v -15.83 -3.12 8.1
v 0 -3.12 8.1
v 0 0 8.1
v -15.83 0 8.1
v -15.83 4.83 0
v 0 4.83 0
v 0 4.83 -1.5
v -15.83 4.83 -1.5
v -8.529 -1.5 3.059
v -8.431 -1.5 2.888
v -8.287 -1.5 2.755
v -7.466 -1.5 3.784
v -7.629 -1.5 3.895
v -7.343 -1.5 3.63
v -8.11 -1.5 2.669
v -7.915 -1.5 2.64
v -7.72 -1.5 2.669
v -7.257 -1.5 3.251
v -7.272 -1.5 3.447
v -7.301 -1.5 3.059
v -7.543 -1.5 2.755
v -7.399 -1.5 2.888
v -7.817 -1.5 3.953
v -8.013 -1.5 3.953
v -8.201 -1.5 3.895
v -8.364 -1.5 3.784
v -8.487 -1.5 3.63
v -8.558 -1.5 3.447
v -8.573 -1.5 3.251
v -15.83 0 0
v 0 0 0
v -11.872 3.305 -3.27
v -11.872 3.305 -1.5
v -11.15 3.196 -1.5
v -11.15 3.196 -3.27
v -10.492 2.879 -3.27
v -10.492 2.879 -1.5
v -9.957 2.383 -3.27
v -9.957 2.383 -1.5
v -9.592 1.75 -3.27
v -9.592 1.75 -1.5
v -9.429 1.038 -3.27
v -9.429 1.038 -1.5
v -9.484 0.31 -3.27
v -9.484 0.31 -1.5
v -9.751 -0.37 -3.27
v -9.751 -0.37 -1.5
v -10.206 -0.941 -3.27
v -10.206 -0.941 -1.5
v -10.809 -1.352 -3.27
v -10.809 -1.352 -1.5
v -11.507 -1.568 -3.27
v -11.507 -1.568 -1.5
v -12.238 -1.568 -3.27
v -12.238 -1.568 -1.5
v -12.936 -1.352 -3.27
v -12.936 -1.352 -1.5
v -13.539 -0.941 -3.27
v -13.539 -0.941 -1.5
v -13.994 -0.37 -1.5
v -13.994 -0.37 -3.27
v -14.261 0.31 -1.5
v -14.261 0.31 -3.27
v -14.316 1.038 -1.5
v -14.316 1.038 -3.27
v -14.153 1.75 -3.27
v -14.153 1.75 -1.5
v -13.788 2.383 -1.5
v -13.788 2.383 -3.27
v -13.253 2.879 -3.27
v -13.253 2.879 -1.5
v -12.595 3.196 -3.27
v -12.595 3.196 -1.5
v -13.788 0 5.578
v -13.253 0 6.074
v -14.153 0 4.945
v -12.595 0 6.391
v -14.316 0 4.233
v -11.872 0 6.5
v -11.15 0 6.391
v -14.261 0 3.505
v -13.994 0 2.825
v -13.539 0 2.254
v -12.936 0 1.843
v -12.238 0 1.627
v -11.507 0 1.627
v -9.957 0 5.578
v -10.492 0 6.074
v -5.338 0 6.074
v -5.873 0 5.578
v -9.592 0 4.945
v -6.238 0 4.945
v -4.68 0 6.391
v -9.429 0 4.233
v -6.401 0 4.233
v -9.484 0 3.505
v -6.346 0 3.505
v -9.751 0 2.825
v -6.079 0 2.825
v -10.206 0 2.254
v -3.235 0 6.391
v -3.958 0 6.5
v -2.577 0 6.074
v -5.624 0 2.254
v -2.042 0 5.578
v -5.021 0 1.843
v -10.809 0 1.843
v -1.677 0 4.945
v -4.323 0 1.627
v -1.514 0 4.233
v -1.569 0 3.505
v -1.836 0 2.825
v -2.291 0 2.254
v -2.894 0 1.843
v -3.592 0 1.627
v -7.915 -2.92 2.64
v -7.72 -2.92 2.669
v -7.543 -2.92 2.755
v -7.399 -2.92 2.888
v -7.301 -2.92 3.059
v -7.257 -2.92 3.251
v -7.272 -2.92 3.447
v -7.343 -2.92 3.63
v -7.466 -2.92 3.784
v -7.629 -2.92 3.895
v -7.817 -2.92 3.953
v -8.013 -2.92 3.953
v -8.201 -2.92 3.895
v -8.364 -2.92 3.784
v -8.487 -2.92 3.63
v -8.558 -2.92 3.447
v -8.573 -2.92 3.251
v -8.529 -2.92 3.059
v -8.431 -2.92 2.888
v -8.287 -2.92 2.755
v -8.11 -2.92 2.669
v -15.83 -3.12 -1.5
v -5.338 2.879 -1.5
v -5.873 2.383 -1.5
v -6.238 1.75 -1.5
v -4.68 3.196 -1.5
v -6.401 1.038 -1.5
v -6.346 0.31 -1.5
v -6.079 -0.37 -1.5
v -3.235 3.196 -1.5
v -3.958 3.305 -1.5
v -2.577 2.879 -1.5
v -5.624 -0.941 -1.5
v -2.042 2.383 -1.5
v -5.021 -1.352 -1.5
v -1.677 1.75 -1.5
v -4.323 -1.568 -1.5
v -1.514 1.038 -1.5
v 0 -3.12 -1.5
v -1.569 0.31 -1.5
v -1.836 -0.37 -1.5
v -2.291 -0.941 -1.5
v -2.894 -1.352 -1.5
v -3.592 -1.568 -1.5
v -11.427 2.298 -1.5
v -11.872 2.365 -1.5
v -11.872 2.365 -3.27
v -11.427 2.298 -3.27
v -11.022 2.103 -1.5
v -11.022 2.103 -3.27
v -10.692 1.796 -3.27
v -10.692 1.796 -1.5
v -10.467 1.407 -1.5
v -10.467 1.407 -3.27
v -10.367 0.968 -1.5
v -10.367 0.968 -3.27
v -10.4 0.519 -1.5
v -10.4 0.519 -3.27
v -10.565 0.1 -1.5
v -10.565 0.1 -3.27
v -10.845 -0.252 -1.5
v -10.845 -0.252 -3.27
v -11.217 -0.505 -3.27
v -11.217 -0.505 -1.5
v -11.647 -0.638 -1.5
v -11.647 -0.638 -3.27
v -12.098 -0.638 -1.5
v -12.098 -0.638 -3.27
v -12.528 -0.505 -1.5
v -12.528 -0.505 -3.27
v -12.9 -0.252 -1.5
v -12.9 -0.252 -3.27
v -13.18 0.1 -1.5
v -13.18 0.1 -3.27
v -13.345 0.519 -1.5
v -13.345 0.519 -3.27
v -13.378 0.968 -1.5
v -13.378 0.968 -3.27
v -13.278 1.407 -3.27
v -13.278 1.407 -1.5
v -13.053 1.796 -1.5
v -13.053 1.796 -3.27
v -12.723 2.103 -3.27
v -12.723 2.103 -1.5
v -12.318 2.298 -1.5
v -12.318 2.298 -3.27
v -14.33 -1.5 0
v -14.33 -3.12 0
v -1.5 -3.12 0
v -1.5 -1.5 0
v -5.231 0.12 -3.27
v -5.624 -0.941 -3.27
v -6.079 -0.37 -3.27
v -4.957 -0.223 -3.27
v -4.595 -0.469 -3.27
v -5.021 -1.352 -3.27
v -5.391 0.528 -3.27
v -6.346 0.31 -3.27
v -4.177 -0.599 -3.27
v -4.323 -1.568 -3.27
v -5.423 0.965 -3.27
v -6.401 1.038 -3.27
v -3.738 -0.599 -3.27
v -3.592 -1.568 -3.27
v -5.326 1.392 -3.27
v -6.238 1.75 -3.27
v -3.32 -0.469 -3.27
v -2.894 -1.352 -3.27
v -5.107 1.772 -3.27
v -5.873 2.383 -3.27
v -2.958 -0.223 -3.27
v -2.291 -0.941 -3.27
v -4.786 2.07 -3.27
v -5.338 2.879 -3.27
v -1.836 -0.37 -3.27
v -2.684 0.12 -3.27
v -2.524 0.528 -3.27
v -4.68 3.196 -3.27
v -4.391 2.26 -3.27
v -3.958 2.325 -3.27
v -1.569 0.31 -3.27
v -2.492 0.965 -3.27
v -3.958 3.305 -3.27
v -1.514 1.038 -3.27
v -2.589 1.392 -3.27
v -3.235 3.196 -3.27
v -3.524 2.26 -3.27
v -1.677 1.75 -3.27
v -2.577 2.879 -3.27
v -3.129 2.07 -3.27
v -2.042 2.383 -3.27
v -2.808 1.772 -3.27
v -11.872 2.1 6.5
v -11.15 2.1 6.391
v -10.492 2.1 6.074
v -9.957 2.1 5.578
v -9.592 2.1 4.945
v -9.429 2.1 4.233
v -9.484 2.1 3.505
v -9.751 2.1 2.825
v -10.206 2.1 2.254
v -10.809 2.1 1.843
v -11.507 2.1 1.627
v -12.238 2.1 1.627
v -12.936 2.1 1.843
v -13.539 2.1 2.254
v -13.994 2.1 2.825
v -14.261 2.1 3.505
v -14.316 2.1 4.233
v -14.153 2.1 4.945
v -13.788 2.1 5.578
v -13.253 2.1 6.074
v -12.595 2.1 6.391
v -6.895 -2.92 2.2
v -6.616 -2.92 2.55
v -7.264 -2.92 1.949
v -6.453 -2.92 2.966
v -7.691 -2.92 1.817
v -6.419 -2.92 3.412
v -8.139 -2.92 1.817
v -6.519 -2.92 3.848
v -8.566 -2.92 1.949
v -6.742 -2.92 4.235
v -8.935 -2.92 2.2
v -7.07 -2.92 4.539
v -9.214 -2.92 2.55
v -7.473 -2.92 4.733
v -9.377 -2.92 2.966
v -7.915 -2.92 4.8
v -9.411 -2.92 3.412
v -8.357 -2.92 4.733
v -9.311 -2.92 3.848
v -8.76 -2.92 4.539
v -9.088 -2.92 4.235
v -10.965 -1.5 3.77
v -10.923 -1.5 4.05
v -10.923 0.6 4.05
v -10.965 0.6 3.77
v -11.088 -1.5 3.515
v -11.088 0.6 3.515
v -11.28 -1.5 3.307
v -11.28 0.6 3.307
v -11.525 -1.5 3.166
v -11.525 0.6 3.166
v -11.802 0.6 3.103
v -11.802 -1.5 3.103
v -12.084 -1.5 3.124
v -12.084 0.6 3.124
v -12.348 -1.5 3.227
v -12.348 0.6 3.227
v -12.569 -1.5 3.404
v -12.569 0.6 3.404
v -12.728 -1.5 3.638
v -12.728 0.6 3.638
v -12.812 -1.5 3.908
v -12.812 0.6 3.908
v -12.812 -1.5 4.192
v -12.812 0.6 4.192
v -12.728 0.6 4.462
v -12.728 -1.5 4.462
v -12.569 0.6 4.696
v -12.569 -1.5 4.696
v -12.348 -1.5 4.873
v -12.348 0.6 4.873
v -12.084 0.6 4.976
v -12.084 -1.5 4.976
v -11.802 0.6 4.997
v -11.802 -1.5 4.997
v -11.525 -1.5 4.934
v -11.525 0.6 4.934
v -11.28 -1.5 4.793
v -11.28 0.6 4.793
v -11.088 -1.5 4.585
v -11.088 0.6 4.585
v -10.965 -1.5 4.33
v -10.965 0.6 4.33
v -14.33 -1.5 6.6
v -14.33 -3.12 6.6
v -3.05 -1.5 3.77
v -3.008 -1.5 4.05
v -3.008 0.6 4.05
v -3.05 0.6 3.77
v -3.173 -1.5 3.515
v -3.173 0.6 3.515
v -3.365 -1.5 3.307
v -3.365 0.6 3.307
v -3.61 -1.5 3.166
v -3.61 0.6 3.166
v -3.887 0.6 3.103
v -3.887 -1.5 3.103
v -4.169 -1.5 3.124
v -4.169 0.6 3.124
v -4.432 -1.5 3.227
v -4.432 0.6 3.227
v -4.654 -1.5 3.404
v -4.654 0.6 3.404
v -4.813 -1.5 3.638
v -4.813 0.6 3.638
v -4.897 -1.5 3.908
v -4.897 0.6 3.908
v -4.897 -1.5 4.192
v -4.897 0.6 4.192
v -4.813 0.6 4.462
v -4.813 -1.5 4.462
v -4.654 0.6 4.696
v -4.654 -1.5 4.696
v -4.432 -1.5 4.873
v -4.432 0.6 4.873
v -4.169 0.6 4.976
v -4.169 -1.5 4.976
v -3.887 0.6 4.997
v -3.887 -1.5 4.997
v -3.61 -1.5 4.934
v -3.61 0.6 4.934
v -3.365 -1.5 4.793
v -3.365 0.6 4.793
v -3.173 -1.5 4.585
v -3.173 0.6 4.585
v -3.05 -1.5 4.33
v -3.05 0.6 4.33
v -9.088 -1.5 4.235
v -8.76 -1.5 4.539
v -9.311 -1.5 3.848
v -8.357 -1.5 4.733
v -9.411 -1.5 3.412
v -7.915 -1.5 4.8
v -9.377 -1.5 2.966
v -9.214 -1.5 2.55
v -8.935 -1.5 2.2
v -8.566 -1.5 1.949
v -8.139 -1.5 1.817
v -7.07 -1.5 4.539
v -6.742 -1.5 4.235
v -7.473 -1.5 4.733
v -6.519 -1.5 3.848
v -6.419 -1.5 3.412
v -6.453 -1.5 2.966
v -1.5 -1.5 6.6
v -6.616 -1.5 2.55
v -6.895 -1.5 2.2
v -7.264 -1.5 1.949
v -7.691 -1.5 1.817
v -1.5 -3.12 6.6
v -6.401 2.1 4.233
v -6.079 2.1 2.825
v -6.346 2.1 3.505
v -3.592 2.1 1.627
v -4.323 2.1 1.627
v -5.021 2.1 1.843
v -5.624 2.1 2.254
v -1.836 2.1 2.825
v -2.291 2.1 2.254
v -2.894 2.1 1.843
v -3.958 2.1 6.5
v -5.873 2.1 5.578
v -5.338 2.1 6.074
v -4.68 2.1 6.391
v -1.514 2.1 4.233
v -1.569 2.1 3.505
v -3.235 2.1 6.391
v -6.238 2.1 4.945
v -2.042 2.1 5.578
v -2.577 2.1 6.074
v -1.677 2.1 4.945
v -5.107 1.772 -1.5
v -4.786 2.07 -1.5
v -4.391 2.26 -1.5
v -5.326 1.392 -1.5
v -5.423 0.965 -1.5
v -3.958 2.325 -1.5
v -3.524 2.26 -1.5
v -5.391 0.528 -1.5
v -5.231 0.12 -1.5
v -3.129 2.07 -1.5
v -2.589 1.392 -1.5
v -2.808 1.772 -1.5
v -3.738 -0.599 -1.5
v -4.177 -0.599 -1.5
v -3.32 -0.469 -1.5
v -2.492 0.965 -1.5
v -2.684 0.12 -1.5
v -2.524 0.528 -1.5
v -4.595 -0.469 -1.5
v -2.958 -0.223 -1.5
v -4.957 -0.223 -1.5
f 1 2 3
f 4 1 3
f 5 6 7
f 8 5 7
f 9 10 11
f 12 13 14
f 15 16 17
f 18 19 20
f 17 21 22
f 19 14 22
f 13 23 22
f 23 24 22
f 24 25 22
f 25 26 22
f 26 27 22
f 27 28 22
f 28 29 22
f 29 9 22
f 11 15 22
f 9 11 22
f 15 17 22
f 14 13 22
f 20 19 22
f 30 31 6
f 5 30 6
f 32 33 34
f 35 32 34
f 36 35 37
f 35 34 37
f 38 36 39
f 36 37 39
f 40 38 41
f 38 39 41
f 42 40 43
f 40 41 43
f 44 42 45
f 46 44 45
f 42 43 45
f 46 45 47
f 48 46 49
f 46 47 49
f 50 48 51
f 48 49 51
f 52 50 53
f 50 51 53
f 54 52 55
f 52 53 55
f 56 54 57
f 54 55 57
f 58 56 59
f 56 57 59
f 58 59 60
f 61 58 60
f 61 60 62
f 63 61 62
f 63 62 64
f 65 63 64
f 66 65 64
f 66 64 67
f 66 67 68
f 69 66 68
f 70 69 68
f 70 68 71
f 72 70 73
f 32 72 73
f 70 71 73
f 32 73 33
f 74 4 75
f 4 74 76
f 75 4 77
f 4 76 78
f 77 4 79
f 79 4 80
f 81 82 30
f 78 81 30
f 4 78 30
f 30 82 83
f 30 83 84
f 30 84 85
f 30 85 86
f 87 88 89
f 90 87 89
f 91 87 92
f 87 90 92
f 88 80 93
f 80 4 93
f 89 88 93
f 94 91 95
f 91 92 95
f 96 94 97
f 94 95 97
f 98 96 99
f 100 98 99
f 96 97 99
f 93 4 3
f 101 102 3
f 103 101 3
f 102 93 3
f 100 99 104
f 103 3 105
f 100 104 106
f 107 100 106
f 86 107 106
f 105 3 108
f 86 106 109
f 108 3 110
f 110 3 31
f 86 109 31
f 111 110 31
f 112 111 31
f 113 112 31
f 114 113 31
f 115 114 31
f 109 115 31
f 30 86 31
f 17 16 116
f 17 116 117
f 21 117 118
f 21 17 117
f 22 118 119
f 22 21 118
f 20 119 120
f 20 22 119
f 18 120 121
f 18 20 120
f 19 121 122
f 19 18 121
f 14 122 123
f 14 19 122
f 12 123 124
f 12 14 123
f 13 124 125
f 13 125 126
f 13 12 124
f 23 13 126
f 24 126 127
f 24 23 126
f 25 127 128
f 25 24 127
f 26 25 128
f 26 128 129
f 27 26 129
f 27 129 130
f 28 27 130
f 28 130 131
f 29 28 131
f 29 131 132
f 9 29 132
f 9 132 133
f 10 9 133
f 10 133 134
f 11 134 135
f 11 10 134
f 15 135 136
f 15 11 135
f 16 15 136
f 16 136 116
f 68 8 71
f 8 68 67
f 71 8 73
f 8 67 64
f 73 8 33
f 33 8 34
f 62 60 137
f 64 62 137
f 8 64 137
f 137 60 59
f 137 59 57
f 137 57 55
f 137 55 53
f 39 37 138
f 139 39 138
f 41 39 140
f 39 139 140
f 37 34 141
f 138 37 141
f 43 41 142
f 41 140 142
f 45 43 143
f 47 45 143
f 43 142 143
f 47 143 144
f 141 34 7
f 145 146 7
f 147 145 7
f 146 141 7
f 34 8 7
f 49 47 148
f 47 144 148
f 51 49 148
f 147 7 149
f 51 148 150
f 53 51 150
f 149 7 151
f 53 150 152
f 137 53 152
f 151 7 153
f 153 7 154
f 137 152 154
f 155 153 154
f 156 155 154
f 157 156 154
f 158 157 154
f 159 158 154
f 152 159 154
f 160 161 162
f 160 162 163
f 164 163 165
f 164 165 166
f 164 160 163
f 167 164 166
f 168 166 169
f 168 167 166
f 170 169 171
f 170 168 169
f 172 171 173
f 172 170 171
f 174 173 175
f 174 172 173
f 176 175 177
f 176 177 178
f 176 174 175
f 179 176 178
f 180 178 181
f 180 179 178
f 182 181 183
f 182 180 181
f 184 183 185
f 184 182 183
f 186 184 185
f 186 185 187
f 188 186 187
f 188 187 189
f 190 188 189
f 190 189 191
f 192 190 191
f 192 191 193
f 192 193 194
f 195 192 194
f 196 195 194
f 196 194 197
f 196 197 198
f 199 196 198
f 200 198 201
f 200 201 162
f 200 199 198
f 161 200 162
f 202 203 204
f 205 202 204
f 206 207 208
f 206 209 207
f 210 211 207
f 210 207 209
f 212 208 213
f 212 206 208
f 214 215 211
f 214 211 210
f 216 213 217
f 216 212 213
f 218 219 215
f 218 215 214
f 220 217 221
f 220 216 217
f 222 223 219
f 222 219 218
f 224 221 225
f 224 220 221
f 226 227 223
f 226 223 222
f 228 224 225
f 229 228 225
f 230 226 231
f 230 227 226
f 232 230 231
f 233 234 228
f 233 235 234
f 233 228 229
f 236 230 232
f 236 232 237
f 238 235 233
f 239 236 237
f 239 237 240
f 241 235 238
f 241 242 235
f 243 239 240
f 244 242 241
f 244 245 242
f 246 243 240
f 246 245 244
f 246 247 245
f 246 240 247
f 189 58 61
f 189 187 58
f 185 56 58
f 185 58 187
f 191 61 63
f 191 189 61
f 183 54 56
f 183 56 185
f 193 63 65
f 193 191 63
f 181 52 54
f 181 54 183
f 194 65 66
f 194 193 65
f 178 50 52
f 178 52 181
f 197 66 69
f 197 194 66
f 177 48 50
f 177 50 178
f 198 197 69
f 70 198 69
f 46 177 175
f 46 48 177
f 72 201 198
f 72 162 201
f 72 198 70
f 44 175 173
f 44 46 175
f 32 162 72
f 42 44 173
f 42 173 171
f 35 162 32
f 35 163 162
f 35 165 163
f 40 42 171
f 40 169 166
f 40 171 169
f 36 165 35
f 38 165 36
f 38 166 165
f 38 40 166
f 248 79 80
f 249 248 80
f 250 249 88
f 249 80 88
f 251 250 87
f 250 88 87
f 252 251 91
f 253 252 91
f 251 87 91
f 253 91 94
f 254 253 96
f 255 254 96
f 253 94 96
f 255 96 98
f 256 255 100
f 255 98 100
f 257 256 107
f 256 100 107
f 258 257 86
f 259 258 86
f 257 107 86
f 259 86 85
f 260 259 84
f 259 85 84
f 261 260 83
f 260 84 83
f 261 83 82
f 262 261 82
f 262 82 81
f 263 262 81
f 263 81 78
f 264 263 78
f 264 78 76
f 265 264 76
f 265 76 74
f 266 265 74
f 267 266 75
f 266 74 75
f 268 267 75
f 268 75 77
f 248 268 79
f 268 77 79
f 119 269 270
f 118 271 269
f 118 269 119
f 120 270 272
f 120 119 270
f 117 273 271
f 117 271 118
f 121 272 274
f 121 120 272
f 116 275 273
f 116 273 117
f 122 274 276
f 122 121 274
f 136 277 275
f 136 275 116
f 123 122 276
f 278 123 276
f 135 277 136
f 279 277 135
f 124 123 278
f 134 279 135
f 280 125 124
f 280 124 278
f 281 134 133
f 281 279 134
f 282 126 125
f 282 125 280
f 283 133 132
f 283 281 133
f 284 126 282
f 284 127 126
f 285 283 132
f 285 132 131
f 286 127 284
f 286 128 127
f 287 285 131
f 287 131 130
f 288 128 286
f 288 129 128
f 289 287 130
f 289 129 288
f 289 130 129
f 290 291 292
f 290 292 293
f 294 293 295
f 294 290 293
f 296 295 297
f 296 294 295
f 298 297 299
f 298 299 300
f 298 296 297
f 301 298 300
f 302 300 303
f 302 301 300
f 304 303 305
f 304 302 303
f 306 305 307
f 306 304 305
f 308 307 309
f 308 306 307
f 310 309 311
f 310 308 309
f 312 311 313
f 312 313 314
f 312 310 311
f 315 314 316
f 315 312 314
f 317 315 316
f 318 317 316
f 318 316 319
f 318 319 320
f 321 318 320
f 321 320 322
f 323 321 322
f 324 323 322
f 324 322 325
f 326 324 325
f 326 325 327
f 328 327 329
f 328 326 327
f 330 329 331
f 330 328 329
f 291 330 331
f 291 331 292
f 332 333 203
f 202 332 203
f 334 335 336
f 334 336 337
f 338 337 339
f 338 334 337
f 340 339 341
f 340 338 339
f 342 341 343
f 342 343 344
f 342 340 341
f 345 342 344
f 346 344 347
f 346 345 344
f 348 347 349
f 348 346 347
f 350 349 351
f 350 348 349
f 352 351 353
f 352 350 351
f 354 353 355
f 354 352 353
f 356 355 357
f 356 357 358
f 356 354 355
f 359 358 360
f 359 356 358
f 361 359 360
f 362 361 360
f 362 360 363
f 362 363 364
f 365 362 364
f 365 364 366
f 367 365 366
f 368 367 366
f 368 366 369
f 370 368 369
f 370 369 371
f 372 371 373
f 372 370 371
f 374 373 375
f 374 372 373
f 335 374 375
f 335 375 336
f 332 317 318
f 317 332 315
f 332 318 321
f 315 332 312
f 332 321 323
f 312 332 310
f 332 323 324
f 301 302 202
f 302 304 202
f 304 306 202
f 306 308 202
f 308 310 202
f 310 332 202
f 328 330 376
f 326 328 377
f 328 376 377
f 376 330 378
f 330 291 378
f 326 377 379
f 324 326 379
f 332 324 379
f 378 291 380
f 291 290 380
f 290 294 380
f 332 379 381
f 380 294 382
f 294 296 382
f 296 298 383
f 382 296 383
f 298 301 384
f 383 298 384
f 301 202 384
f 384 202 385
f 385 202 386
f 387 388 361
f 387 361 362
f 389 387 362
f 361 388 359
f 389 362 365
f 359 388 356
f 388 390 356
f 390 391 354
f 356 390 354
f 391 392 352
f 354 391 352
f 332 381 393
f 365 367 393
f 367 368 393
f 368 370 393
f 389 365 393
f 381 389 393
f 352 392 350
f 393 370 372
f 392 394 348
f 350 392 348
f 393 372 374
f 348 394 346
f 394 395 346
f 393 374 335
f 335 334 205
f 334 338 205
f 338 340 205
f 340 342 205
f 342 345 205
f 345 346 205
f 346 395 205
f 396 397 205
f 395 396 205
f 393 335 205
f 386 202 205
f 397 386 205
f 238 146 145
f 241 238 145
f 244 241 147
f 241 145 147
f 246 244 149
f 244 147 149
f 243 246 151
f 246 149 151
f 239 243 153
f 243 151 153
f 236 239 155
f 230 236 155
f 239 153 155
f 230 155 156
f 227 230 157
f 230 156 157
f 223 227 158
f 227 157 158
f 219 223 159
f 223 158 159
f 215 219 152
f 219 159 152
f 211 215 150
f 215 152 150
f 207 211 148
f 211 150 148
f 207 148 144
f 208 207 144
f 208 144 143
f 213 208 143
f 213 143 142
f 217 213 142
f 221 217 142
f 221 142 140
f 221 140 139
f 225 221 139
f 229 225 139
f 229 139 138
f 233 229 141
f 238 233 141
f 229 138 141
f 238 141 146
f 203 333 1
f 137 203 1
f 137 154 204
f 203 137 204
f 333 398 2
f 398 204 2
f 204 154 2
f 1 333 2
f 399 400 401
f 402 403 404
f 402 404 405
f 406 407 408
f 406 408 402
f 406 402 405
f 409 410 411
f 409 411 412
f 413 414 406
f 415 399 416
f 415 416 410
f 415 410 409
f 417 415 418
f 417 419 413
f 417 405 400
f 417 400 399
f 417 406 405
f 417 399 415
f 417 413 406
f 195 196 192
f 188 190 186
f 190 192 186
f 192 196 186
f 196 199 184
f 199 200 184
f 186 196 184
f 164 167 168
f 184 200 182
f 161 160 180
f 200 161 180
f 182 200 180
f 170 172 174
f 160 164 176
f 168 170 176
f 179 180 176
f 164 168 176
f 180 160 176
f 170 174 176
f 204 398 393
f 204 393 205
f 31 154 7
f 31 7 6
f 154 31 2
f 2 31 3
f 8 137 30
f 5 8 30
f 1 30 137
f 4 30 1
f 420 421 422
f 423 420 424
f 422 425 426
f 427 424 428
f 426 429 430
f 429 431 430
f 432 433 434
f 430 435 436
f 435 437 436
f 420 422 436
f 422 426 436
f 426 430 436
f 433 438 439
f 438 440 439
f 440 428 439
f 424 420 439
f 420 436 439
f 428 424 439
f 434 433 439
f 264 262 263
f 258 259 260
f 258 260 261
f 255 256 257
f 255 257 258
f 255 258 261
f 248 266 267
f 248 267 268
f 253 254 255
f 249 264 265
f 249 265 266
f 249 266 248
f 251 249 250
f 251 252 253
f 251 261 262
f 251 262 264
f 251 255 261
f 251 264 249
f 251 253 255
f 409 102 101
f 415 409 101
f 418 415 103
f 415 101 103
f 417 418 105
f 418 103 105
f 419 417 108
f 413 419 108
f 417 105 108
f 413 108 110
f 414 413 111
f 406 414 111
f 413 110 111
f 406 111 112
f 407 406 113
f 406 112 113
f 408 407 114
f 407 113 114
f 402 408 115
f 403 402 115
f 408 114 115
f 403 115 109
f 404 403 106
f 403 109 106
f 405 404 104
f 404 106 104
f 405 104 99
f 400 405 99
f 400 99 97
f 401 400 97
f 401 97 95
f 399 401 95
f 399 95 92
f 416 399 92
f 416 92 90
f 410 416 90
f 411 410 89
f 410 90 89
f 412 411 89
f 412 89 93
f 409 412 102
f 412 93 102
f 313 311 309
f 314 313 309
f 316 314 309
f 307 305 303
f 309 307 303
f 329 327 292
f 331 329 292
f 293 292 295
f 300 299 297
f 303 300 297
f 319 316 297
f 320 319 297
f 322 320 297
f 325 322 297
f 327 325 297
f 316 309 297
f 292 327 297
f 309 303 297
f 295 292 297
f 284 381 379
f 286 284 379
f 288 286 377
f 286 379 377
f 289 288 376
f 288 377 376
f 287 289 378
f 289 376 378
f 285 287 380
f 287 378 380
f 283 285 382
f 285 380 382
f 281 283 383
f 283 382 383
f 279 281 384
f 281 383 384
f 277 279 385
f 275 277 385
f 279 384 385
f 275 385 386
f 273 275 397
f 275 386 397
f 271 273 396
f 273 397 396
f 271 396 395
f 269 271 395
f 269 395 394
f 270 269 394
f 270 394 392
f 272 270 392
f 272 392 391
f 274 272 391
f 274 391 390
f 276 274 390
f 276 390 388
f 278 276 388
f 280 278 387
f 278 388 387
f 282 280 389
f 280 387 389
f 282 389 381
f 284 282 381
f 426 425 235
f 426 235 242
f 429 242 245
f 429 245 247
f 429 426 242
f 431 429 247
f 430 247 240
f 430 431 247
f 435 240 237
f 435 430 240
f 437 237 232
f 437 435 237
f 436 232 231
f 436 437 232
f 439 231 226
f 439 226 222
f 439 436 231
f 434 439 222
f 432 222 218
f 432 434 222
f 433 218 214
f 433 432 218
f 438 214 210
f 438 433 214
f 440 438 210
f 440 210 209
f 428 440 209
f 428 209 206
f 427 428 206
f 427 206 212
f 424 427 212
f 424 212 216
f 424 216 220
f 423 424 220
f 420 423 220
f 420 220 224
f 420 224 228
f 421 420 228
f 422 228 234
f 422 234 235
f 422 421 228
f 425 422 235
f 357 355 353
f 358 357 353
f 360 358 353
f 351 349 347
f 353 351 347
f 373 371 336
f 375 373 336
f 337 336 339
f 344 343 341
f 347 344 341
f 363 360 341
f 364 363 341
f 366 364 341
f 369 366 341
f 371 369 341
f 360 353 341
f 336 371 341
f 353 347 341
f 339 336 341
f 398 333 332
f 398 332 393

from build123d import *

# Parameters (mm, degrees)
BOSS_EXTRUDE1_DEPTH = 15.83
SKETCH2_R           = 2.45
BOSS_EXTRUDE2_DEPTH = 2.1
SHELL1_START        = -3.12
SHELL1_OUTLINE_W    = 12.83
SHELL1_OUTLINE_H    = 6.6
SHELL1_DEPTH        = 1.62
SHELL1_START_2      = -1.5
SHELL1_2_OUTLINE_R  = 0.95
SHELL1_2_DEPTH      = 2.1
SKETCH3_R           = 2.45
SKETCH3_R_2         = 1.47
SKETCH3_R_3         = 1.51
BOSS_EXTRUDE3_DEPTH = 1.77
SKETCH4_R           = 1.5
SKETCH4_R_2         = 0.66
BOSS_EXTRUDE4_DEPTH = 1.42


# Read off the part's stored shape, not the designer's step: Shell1
with BuildPart() as part:
    # Sketch1 → Boss-Extrude1 (new body)
    with BuildSketch(Plane(origin=(0, 0, 0), x_dir=(0, 0, -1), z_dir=(1, 0, 0))):
        Polygon((0, 0), (0, 4.83), (1.5, 4.83), (1.5, -3.12), (-8.1, -3.12), (-8.1, 0), align=None)
    extrude(amount=-BOSS_EXTRUDE1_DEPTH)

    # Sketch2 → Boss-Extrude2 (add)
    with BuildSketch(Plane(origin=(0, 0, 0), x_dir=(1, 0, 0), z_dir=(0, 1, 0))):
        with Locations(Location((-11.8725, -4.05, 0), (0, 0, 270))):
            Circle(SKETCH2_R)
        with Locations(Location((-3.9575, -4.05, 0), (0, 0, 270))):
            Circle(SKETCH2_R)
    extrude(amount=BOSS_EXTRUDE2_DEPTH)

    # Shell1 outline → Shell1 (cut)
    with BuildSketch(Plane(origin=(0, 0, 0), x_dir=(1, 0, 0), z_dir=(0, 1, 0)).offset(SHELL1_START)):
        with Locations((-7.915, -3.3)):
            Rectangle(SHELL1_OUTLINE_W, SHELL1_OUTLINE_H)
    extrude(amount=SHELL1_DEPTH, mode=Mode.SUBTRACT)

    # Shell1 2 outline → Shell1 2 (cut)
    with BuildSketch(Plane(origin=(0, 0, 0), x_dir=(1, 0, 0), z_dir=(0, 1, 0)).offset(SHELL1_START_2)):
        with Locations((-11.8725, -4.05)):
            Circle(SHELL1_2_OUTLINE_R)
        with Locations((-3.9575, -4.05)):
            Circle(SHELL1_2_OUTLINE_R)
    extrude(amount=SHELL1_2_DEPTH, mode=Mode.SUBTRACT)

    # Sketch3 → Boss-Extrude3 (add)
    # profile 1 of 2: a face of its own
    with BuildSketch(Plane(origin=(0, 0, -1.5), x_dir=(-1, 0, 0), z_dir=(0, 0, -1))):
        with Locations(Location((3.9575, 0.855, 0), (0, 0, 90))):
            Circle(SKETCH3_R)
        with Locations(Location((3.9575, 0.855, 0), (0, 0, 90))):
            Circle(SKETCH3_R_2, mode=Mode.SUBTRACT)
    # profile 2 of 2: a face of its own
    with BuildSketch(Plane(origin=(0, 0, -1.5), x_dir=(-1, 0, 0), z_dir=(0, 0, -1))):
        with Locations(Location((11.8725, 0.855, 0), (0, 0, 90))):
            Circle(SKETCH3_R)
        with Locations(Location((11.8725, 0.855, 0), (0, 0, 90))):
            Circle(SKETCH3_R_3, mode=Mode.SUBTRACT)
    extrude(amount=BOSS_EXTRUDE3_DEPTH)

    # Sketch4 → Boss-Extrude4 (add)
    with BuildSketch(Plane.XZ.offset(1.5)):
        with Locations(Location((-7.915, 3.3, 0), (0, 0, 90))):
            Circle(SKETCH4_R)
        with Locations(Location((-7.915, 3.3, 0), (0, 0, 270))):
            Circle(SKETCH4_R_2, mode=Mode.SUBTRACT)
    extrude(amount=BOSS_EXTRUDE4_DEPTH)


solid = part.part
